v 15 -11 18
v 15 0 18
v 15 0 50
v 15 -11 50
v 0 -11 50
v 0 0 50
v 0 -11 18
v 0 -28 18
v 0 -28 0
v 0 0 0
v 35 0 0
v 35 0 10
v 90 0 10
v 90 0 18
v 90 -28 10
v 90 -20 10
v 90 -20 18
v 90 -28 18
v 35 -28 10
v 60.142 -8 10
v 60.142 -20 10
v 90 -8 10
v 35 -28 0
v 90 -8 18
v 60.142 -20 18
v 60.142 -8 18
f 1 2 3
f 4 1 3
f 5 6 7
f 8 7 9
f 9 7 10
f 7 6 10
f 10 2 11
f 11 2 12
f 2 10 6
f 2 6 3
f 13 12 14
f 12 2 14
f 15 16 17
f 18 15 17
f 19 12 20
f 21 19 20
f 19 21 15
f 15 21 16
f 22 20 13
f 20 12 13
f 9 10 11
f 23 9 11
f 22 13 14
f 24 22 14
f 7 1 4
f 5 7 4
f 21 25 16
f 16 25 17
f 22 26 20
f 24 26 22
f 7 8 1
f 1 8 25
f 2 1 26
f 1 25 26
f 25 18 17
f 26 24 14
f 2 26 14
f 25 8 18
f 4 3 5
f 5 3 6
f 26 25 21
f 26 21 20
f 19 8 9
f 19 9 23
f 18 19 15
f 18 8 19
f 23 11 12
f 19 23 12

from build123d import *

# Parameters (mm, degrees)
F1_DEPTH = 28
F2_W     = 17
F2_H     = 32
F3_DEPTH = 25
F4_W     = 29.857718
F4_H     = 12
F5_DEPTH = 25


with BuildPart() as f1:
    # F0 (on Front) → F1 (new body)
    with BuildSketch(Plane.XZ):
        Polygon((0, 50), (0, 0), (35, 0), (35, 10), (90, 10), (90, 18), (15, 18), (15, 50), align=None)
    extrude(amount=F1_DEPTH)

    # F2 (on face) → F3 (cut)
    with BuildSketch(Plane.YZ.offset(15)):
        with Locations((-19.5, 34)):
            Rectangle(F2_W, F2_H)
    extrude(amount=-F3_DEPTH, mode=Mode.SUBTRACT)

    # F4 (on face) → F5 (cut)
    with BuildSketch(Plane.XY.offset(18)):
        with Locations((75.071141, -14)):
            Rectangle(F4_W, F4_H)
    extrude(amount=-F5_DEPTH, mode=Mode.SUBTRACT)


solid = f1.part
